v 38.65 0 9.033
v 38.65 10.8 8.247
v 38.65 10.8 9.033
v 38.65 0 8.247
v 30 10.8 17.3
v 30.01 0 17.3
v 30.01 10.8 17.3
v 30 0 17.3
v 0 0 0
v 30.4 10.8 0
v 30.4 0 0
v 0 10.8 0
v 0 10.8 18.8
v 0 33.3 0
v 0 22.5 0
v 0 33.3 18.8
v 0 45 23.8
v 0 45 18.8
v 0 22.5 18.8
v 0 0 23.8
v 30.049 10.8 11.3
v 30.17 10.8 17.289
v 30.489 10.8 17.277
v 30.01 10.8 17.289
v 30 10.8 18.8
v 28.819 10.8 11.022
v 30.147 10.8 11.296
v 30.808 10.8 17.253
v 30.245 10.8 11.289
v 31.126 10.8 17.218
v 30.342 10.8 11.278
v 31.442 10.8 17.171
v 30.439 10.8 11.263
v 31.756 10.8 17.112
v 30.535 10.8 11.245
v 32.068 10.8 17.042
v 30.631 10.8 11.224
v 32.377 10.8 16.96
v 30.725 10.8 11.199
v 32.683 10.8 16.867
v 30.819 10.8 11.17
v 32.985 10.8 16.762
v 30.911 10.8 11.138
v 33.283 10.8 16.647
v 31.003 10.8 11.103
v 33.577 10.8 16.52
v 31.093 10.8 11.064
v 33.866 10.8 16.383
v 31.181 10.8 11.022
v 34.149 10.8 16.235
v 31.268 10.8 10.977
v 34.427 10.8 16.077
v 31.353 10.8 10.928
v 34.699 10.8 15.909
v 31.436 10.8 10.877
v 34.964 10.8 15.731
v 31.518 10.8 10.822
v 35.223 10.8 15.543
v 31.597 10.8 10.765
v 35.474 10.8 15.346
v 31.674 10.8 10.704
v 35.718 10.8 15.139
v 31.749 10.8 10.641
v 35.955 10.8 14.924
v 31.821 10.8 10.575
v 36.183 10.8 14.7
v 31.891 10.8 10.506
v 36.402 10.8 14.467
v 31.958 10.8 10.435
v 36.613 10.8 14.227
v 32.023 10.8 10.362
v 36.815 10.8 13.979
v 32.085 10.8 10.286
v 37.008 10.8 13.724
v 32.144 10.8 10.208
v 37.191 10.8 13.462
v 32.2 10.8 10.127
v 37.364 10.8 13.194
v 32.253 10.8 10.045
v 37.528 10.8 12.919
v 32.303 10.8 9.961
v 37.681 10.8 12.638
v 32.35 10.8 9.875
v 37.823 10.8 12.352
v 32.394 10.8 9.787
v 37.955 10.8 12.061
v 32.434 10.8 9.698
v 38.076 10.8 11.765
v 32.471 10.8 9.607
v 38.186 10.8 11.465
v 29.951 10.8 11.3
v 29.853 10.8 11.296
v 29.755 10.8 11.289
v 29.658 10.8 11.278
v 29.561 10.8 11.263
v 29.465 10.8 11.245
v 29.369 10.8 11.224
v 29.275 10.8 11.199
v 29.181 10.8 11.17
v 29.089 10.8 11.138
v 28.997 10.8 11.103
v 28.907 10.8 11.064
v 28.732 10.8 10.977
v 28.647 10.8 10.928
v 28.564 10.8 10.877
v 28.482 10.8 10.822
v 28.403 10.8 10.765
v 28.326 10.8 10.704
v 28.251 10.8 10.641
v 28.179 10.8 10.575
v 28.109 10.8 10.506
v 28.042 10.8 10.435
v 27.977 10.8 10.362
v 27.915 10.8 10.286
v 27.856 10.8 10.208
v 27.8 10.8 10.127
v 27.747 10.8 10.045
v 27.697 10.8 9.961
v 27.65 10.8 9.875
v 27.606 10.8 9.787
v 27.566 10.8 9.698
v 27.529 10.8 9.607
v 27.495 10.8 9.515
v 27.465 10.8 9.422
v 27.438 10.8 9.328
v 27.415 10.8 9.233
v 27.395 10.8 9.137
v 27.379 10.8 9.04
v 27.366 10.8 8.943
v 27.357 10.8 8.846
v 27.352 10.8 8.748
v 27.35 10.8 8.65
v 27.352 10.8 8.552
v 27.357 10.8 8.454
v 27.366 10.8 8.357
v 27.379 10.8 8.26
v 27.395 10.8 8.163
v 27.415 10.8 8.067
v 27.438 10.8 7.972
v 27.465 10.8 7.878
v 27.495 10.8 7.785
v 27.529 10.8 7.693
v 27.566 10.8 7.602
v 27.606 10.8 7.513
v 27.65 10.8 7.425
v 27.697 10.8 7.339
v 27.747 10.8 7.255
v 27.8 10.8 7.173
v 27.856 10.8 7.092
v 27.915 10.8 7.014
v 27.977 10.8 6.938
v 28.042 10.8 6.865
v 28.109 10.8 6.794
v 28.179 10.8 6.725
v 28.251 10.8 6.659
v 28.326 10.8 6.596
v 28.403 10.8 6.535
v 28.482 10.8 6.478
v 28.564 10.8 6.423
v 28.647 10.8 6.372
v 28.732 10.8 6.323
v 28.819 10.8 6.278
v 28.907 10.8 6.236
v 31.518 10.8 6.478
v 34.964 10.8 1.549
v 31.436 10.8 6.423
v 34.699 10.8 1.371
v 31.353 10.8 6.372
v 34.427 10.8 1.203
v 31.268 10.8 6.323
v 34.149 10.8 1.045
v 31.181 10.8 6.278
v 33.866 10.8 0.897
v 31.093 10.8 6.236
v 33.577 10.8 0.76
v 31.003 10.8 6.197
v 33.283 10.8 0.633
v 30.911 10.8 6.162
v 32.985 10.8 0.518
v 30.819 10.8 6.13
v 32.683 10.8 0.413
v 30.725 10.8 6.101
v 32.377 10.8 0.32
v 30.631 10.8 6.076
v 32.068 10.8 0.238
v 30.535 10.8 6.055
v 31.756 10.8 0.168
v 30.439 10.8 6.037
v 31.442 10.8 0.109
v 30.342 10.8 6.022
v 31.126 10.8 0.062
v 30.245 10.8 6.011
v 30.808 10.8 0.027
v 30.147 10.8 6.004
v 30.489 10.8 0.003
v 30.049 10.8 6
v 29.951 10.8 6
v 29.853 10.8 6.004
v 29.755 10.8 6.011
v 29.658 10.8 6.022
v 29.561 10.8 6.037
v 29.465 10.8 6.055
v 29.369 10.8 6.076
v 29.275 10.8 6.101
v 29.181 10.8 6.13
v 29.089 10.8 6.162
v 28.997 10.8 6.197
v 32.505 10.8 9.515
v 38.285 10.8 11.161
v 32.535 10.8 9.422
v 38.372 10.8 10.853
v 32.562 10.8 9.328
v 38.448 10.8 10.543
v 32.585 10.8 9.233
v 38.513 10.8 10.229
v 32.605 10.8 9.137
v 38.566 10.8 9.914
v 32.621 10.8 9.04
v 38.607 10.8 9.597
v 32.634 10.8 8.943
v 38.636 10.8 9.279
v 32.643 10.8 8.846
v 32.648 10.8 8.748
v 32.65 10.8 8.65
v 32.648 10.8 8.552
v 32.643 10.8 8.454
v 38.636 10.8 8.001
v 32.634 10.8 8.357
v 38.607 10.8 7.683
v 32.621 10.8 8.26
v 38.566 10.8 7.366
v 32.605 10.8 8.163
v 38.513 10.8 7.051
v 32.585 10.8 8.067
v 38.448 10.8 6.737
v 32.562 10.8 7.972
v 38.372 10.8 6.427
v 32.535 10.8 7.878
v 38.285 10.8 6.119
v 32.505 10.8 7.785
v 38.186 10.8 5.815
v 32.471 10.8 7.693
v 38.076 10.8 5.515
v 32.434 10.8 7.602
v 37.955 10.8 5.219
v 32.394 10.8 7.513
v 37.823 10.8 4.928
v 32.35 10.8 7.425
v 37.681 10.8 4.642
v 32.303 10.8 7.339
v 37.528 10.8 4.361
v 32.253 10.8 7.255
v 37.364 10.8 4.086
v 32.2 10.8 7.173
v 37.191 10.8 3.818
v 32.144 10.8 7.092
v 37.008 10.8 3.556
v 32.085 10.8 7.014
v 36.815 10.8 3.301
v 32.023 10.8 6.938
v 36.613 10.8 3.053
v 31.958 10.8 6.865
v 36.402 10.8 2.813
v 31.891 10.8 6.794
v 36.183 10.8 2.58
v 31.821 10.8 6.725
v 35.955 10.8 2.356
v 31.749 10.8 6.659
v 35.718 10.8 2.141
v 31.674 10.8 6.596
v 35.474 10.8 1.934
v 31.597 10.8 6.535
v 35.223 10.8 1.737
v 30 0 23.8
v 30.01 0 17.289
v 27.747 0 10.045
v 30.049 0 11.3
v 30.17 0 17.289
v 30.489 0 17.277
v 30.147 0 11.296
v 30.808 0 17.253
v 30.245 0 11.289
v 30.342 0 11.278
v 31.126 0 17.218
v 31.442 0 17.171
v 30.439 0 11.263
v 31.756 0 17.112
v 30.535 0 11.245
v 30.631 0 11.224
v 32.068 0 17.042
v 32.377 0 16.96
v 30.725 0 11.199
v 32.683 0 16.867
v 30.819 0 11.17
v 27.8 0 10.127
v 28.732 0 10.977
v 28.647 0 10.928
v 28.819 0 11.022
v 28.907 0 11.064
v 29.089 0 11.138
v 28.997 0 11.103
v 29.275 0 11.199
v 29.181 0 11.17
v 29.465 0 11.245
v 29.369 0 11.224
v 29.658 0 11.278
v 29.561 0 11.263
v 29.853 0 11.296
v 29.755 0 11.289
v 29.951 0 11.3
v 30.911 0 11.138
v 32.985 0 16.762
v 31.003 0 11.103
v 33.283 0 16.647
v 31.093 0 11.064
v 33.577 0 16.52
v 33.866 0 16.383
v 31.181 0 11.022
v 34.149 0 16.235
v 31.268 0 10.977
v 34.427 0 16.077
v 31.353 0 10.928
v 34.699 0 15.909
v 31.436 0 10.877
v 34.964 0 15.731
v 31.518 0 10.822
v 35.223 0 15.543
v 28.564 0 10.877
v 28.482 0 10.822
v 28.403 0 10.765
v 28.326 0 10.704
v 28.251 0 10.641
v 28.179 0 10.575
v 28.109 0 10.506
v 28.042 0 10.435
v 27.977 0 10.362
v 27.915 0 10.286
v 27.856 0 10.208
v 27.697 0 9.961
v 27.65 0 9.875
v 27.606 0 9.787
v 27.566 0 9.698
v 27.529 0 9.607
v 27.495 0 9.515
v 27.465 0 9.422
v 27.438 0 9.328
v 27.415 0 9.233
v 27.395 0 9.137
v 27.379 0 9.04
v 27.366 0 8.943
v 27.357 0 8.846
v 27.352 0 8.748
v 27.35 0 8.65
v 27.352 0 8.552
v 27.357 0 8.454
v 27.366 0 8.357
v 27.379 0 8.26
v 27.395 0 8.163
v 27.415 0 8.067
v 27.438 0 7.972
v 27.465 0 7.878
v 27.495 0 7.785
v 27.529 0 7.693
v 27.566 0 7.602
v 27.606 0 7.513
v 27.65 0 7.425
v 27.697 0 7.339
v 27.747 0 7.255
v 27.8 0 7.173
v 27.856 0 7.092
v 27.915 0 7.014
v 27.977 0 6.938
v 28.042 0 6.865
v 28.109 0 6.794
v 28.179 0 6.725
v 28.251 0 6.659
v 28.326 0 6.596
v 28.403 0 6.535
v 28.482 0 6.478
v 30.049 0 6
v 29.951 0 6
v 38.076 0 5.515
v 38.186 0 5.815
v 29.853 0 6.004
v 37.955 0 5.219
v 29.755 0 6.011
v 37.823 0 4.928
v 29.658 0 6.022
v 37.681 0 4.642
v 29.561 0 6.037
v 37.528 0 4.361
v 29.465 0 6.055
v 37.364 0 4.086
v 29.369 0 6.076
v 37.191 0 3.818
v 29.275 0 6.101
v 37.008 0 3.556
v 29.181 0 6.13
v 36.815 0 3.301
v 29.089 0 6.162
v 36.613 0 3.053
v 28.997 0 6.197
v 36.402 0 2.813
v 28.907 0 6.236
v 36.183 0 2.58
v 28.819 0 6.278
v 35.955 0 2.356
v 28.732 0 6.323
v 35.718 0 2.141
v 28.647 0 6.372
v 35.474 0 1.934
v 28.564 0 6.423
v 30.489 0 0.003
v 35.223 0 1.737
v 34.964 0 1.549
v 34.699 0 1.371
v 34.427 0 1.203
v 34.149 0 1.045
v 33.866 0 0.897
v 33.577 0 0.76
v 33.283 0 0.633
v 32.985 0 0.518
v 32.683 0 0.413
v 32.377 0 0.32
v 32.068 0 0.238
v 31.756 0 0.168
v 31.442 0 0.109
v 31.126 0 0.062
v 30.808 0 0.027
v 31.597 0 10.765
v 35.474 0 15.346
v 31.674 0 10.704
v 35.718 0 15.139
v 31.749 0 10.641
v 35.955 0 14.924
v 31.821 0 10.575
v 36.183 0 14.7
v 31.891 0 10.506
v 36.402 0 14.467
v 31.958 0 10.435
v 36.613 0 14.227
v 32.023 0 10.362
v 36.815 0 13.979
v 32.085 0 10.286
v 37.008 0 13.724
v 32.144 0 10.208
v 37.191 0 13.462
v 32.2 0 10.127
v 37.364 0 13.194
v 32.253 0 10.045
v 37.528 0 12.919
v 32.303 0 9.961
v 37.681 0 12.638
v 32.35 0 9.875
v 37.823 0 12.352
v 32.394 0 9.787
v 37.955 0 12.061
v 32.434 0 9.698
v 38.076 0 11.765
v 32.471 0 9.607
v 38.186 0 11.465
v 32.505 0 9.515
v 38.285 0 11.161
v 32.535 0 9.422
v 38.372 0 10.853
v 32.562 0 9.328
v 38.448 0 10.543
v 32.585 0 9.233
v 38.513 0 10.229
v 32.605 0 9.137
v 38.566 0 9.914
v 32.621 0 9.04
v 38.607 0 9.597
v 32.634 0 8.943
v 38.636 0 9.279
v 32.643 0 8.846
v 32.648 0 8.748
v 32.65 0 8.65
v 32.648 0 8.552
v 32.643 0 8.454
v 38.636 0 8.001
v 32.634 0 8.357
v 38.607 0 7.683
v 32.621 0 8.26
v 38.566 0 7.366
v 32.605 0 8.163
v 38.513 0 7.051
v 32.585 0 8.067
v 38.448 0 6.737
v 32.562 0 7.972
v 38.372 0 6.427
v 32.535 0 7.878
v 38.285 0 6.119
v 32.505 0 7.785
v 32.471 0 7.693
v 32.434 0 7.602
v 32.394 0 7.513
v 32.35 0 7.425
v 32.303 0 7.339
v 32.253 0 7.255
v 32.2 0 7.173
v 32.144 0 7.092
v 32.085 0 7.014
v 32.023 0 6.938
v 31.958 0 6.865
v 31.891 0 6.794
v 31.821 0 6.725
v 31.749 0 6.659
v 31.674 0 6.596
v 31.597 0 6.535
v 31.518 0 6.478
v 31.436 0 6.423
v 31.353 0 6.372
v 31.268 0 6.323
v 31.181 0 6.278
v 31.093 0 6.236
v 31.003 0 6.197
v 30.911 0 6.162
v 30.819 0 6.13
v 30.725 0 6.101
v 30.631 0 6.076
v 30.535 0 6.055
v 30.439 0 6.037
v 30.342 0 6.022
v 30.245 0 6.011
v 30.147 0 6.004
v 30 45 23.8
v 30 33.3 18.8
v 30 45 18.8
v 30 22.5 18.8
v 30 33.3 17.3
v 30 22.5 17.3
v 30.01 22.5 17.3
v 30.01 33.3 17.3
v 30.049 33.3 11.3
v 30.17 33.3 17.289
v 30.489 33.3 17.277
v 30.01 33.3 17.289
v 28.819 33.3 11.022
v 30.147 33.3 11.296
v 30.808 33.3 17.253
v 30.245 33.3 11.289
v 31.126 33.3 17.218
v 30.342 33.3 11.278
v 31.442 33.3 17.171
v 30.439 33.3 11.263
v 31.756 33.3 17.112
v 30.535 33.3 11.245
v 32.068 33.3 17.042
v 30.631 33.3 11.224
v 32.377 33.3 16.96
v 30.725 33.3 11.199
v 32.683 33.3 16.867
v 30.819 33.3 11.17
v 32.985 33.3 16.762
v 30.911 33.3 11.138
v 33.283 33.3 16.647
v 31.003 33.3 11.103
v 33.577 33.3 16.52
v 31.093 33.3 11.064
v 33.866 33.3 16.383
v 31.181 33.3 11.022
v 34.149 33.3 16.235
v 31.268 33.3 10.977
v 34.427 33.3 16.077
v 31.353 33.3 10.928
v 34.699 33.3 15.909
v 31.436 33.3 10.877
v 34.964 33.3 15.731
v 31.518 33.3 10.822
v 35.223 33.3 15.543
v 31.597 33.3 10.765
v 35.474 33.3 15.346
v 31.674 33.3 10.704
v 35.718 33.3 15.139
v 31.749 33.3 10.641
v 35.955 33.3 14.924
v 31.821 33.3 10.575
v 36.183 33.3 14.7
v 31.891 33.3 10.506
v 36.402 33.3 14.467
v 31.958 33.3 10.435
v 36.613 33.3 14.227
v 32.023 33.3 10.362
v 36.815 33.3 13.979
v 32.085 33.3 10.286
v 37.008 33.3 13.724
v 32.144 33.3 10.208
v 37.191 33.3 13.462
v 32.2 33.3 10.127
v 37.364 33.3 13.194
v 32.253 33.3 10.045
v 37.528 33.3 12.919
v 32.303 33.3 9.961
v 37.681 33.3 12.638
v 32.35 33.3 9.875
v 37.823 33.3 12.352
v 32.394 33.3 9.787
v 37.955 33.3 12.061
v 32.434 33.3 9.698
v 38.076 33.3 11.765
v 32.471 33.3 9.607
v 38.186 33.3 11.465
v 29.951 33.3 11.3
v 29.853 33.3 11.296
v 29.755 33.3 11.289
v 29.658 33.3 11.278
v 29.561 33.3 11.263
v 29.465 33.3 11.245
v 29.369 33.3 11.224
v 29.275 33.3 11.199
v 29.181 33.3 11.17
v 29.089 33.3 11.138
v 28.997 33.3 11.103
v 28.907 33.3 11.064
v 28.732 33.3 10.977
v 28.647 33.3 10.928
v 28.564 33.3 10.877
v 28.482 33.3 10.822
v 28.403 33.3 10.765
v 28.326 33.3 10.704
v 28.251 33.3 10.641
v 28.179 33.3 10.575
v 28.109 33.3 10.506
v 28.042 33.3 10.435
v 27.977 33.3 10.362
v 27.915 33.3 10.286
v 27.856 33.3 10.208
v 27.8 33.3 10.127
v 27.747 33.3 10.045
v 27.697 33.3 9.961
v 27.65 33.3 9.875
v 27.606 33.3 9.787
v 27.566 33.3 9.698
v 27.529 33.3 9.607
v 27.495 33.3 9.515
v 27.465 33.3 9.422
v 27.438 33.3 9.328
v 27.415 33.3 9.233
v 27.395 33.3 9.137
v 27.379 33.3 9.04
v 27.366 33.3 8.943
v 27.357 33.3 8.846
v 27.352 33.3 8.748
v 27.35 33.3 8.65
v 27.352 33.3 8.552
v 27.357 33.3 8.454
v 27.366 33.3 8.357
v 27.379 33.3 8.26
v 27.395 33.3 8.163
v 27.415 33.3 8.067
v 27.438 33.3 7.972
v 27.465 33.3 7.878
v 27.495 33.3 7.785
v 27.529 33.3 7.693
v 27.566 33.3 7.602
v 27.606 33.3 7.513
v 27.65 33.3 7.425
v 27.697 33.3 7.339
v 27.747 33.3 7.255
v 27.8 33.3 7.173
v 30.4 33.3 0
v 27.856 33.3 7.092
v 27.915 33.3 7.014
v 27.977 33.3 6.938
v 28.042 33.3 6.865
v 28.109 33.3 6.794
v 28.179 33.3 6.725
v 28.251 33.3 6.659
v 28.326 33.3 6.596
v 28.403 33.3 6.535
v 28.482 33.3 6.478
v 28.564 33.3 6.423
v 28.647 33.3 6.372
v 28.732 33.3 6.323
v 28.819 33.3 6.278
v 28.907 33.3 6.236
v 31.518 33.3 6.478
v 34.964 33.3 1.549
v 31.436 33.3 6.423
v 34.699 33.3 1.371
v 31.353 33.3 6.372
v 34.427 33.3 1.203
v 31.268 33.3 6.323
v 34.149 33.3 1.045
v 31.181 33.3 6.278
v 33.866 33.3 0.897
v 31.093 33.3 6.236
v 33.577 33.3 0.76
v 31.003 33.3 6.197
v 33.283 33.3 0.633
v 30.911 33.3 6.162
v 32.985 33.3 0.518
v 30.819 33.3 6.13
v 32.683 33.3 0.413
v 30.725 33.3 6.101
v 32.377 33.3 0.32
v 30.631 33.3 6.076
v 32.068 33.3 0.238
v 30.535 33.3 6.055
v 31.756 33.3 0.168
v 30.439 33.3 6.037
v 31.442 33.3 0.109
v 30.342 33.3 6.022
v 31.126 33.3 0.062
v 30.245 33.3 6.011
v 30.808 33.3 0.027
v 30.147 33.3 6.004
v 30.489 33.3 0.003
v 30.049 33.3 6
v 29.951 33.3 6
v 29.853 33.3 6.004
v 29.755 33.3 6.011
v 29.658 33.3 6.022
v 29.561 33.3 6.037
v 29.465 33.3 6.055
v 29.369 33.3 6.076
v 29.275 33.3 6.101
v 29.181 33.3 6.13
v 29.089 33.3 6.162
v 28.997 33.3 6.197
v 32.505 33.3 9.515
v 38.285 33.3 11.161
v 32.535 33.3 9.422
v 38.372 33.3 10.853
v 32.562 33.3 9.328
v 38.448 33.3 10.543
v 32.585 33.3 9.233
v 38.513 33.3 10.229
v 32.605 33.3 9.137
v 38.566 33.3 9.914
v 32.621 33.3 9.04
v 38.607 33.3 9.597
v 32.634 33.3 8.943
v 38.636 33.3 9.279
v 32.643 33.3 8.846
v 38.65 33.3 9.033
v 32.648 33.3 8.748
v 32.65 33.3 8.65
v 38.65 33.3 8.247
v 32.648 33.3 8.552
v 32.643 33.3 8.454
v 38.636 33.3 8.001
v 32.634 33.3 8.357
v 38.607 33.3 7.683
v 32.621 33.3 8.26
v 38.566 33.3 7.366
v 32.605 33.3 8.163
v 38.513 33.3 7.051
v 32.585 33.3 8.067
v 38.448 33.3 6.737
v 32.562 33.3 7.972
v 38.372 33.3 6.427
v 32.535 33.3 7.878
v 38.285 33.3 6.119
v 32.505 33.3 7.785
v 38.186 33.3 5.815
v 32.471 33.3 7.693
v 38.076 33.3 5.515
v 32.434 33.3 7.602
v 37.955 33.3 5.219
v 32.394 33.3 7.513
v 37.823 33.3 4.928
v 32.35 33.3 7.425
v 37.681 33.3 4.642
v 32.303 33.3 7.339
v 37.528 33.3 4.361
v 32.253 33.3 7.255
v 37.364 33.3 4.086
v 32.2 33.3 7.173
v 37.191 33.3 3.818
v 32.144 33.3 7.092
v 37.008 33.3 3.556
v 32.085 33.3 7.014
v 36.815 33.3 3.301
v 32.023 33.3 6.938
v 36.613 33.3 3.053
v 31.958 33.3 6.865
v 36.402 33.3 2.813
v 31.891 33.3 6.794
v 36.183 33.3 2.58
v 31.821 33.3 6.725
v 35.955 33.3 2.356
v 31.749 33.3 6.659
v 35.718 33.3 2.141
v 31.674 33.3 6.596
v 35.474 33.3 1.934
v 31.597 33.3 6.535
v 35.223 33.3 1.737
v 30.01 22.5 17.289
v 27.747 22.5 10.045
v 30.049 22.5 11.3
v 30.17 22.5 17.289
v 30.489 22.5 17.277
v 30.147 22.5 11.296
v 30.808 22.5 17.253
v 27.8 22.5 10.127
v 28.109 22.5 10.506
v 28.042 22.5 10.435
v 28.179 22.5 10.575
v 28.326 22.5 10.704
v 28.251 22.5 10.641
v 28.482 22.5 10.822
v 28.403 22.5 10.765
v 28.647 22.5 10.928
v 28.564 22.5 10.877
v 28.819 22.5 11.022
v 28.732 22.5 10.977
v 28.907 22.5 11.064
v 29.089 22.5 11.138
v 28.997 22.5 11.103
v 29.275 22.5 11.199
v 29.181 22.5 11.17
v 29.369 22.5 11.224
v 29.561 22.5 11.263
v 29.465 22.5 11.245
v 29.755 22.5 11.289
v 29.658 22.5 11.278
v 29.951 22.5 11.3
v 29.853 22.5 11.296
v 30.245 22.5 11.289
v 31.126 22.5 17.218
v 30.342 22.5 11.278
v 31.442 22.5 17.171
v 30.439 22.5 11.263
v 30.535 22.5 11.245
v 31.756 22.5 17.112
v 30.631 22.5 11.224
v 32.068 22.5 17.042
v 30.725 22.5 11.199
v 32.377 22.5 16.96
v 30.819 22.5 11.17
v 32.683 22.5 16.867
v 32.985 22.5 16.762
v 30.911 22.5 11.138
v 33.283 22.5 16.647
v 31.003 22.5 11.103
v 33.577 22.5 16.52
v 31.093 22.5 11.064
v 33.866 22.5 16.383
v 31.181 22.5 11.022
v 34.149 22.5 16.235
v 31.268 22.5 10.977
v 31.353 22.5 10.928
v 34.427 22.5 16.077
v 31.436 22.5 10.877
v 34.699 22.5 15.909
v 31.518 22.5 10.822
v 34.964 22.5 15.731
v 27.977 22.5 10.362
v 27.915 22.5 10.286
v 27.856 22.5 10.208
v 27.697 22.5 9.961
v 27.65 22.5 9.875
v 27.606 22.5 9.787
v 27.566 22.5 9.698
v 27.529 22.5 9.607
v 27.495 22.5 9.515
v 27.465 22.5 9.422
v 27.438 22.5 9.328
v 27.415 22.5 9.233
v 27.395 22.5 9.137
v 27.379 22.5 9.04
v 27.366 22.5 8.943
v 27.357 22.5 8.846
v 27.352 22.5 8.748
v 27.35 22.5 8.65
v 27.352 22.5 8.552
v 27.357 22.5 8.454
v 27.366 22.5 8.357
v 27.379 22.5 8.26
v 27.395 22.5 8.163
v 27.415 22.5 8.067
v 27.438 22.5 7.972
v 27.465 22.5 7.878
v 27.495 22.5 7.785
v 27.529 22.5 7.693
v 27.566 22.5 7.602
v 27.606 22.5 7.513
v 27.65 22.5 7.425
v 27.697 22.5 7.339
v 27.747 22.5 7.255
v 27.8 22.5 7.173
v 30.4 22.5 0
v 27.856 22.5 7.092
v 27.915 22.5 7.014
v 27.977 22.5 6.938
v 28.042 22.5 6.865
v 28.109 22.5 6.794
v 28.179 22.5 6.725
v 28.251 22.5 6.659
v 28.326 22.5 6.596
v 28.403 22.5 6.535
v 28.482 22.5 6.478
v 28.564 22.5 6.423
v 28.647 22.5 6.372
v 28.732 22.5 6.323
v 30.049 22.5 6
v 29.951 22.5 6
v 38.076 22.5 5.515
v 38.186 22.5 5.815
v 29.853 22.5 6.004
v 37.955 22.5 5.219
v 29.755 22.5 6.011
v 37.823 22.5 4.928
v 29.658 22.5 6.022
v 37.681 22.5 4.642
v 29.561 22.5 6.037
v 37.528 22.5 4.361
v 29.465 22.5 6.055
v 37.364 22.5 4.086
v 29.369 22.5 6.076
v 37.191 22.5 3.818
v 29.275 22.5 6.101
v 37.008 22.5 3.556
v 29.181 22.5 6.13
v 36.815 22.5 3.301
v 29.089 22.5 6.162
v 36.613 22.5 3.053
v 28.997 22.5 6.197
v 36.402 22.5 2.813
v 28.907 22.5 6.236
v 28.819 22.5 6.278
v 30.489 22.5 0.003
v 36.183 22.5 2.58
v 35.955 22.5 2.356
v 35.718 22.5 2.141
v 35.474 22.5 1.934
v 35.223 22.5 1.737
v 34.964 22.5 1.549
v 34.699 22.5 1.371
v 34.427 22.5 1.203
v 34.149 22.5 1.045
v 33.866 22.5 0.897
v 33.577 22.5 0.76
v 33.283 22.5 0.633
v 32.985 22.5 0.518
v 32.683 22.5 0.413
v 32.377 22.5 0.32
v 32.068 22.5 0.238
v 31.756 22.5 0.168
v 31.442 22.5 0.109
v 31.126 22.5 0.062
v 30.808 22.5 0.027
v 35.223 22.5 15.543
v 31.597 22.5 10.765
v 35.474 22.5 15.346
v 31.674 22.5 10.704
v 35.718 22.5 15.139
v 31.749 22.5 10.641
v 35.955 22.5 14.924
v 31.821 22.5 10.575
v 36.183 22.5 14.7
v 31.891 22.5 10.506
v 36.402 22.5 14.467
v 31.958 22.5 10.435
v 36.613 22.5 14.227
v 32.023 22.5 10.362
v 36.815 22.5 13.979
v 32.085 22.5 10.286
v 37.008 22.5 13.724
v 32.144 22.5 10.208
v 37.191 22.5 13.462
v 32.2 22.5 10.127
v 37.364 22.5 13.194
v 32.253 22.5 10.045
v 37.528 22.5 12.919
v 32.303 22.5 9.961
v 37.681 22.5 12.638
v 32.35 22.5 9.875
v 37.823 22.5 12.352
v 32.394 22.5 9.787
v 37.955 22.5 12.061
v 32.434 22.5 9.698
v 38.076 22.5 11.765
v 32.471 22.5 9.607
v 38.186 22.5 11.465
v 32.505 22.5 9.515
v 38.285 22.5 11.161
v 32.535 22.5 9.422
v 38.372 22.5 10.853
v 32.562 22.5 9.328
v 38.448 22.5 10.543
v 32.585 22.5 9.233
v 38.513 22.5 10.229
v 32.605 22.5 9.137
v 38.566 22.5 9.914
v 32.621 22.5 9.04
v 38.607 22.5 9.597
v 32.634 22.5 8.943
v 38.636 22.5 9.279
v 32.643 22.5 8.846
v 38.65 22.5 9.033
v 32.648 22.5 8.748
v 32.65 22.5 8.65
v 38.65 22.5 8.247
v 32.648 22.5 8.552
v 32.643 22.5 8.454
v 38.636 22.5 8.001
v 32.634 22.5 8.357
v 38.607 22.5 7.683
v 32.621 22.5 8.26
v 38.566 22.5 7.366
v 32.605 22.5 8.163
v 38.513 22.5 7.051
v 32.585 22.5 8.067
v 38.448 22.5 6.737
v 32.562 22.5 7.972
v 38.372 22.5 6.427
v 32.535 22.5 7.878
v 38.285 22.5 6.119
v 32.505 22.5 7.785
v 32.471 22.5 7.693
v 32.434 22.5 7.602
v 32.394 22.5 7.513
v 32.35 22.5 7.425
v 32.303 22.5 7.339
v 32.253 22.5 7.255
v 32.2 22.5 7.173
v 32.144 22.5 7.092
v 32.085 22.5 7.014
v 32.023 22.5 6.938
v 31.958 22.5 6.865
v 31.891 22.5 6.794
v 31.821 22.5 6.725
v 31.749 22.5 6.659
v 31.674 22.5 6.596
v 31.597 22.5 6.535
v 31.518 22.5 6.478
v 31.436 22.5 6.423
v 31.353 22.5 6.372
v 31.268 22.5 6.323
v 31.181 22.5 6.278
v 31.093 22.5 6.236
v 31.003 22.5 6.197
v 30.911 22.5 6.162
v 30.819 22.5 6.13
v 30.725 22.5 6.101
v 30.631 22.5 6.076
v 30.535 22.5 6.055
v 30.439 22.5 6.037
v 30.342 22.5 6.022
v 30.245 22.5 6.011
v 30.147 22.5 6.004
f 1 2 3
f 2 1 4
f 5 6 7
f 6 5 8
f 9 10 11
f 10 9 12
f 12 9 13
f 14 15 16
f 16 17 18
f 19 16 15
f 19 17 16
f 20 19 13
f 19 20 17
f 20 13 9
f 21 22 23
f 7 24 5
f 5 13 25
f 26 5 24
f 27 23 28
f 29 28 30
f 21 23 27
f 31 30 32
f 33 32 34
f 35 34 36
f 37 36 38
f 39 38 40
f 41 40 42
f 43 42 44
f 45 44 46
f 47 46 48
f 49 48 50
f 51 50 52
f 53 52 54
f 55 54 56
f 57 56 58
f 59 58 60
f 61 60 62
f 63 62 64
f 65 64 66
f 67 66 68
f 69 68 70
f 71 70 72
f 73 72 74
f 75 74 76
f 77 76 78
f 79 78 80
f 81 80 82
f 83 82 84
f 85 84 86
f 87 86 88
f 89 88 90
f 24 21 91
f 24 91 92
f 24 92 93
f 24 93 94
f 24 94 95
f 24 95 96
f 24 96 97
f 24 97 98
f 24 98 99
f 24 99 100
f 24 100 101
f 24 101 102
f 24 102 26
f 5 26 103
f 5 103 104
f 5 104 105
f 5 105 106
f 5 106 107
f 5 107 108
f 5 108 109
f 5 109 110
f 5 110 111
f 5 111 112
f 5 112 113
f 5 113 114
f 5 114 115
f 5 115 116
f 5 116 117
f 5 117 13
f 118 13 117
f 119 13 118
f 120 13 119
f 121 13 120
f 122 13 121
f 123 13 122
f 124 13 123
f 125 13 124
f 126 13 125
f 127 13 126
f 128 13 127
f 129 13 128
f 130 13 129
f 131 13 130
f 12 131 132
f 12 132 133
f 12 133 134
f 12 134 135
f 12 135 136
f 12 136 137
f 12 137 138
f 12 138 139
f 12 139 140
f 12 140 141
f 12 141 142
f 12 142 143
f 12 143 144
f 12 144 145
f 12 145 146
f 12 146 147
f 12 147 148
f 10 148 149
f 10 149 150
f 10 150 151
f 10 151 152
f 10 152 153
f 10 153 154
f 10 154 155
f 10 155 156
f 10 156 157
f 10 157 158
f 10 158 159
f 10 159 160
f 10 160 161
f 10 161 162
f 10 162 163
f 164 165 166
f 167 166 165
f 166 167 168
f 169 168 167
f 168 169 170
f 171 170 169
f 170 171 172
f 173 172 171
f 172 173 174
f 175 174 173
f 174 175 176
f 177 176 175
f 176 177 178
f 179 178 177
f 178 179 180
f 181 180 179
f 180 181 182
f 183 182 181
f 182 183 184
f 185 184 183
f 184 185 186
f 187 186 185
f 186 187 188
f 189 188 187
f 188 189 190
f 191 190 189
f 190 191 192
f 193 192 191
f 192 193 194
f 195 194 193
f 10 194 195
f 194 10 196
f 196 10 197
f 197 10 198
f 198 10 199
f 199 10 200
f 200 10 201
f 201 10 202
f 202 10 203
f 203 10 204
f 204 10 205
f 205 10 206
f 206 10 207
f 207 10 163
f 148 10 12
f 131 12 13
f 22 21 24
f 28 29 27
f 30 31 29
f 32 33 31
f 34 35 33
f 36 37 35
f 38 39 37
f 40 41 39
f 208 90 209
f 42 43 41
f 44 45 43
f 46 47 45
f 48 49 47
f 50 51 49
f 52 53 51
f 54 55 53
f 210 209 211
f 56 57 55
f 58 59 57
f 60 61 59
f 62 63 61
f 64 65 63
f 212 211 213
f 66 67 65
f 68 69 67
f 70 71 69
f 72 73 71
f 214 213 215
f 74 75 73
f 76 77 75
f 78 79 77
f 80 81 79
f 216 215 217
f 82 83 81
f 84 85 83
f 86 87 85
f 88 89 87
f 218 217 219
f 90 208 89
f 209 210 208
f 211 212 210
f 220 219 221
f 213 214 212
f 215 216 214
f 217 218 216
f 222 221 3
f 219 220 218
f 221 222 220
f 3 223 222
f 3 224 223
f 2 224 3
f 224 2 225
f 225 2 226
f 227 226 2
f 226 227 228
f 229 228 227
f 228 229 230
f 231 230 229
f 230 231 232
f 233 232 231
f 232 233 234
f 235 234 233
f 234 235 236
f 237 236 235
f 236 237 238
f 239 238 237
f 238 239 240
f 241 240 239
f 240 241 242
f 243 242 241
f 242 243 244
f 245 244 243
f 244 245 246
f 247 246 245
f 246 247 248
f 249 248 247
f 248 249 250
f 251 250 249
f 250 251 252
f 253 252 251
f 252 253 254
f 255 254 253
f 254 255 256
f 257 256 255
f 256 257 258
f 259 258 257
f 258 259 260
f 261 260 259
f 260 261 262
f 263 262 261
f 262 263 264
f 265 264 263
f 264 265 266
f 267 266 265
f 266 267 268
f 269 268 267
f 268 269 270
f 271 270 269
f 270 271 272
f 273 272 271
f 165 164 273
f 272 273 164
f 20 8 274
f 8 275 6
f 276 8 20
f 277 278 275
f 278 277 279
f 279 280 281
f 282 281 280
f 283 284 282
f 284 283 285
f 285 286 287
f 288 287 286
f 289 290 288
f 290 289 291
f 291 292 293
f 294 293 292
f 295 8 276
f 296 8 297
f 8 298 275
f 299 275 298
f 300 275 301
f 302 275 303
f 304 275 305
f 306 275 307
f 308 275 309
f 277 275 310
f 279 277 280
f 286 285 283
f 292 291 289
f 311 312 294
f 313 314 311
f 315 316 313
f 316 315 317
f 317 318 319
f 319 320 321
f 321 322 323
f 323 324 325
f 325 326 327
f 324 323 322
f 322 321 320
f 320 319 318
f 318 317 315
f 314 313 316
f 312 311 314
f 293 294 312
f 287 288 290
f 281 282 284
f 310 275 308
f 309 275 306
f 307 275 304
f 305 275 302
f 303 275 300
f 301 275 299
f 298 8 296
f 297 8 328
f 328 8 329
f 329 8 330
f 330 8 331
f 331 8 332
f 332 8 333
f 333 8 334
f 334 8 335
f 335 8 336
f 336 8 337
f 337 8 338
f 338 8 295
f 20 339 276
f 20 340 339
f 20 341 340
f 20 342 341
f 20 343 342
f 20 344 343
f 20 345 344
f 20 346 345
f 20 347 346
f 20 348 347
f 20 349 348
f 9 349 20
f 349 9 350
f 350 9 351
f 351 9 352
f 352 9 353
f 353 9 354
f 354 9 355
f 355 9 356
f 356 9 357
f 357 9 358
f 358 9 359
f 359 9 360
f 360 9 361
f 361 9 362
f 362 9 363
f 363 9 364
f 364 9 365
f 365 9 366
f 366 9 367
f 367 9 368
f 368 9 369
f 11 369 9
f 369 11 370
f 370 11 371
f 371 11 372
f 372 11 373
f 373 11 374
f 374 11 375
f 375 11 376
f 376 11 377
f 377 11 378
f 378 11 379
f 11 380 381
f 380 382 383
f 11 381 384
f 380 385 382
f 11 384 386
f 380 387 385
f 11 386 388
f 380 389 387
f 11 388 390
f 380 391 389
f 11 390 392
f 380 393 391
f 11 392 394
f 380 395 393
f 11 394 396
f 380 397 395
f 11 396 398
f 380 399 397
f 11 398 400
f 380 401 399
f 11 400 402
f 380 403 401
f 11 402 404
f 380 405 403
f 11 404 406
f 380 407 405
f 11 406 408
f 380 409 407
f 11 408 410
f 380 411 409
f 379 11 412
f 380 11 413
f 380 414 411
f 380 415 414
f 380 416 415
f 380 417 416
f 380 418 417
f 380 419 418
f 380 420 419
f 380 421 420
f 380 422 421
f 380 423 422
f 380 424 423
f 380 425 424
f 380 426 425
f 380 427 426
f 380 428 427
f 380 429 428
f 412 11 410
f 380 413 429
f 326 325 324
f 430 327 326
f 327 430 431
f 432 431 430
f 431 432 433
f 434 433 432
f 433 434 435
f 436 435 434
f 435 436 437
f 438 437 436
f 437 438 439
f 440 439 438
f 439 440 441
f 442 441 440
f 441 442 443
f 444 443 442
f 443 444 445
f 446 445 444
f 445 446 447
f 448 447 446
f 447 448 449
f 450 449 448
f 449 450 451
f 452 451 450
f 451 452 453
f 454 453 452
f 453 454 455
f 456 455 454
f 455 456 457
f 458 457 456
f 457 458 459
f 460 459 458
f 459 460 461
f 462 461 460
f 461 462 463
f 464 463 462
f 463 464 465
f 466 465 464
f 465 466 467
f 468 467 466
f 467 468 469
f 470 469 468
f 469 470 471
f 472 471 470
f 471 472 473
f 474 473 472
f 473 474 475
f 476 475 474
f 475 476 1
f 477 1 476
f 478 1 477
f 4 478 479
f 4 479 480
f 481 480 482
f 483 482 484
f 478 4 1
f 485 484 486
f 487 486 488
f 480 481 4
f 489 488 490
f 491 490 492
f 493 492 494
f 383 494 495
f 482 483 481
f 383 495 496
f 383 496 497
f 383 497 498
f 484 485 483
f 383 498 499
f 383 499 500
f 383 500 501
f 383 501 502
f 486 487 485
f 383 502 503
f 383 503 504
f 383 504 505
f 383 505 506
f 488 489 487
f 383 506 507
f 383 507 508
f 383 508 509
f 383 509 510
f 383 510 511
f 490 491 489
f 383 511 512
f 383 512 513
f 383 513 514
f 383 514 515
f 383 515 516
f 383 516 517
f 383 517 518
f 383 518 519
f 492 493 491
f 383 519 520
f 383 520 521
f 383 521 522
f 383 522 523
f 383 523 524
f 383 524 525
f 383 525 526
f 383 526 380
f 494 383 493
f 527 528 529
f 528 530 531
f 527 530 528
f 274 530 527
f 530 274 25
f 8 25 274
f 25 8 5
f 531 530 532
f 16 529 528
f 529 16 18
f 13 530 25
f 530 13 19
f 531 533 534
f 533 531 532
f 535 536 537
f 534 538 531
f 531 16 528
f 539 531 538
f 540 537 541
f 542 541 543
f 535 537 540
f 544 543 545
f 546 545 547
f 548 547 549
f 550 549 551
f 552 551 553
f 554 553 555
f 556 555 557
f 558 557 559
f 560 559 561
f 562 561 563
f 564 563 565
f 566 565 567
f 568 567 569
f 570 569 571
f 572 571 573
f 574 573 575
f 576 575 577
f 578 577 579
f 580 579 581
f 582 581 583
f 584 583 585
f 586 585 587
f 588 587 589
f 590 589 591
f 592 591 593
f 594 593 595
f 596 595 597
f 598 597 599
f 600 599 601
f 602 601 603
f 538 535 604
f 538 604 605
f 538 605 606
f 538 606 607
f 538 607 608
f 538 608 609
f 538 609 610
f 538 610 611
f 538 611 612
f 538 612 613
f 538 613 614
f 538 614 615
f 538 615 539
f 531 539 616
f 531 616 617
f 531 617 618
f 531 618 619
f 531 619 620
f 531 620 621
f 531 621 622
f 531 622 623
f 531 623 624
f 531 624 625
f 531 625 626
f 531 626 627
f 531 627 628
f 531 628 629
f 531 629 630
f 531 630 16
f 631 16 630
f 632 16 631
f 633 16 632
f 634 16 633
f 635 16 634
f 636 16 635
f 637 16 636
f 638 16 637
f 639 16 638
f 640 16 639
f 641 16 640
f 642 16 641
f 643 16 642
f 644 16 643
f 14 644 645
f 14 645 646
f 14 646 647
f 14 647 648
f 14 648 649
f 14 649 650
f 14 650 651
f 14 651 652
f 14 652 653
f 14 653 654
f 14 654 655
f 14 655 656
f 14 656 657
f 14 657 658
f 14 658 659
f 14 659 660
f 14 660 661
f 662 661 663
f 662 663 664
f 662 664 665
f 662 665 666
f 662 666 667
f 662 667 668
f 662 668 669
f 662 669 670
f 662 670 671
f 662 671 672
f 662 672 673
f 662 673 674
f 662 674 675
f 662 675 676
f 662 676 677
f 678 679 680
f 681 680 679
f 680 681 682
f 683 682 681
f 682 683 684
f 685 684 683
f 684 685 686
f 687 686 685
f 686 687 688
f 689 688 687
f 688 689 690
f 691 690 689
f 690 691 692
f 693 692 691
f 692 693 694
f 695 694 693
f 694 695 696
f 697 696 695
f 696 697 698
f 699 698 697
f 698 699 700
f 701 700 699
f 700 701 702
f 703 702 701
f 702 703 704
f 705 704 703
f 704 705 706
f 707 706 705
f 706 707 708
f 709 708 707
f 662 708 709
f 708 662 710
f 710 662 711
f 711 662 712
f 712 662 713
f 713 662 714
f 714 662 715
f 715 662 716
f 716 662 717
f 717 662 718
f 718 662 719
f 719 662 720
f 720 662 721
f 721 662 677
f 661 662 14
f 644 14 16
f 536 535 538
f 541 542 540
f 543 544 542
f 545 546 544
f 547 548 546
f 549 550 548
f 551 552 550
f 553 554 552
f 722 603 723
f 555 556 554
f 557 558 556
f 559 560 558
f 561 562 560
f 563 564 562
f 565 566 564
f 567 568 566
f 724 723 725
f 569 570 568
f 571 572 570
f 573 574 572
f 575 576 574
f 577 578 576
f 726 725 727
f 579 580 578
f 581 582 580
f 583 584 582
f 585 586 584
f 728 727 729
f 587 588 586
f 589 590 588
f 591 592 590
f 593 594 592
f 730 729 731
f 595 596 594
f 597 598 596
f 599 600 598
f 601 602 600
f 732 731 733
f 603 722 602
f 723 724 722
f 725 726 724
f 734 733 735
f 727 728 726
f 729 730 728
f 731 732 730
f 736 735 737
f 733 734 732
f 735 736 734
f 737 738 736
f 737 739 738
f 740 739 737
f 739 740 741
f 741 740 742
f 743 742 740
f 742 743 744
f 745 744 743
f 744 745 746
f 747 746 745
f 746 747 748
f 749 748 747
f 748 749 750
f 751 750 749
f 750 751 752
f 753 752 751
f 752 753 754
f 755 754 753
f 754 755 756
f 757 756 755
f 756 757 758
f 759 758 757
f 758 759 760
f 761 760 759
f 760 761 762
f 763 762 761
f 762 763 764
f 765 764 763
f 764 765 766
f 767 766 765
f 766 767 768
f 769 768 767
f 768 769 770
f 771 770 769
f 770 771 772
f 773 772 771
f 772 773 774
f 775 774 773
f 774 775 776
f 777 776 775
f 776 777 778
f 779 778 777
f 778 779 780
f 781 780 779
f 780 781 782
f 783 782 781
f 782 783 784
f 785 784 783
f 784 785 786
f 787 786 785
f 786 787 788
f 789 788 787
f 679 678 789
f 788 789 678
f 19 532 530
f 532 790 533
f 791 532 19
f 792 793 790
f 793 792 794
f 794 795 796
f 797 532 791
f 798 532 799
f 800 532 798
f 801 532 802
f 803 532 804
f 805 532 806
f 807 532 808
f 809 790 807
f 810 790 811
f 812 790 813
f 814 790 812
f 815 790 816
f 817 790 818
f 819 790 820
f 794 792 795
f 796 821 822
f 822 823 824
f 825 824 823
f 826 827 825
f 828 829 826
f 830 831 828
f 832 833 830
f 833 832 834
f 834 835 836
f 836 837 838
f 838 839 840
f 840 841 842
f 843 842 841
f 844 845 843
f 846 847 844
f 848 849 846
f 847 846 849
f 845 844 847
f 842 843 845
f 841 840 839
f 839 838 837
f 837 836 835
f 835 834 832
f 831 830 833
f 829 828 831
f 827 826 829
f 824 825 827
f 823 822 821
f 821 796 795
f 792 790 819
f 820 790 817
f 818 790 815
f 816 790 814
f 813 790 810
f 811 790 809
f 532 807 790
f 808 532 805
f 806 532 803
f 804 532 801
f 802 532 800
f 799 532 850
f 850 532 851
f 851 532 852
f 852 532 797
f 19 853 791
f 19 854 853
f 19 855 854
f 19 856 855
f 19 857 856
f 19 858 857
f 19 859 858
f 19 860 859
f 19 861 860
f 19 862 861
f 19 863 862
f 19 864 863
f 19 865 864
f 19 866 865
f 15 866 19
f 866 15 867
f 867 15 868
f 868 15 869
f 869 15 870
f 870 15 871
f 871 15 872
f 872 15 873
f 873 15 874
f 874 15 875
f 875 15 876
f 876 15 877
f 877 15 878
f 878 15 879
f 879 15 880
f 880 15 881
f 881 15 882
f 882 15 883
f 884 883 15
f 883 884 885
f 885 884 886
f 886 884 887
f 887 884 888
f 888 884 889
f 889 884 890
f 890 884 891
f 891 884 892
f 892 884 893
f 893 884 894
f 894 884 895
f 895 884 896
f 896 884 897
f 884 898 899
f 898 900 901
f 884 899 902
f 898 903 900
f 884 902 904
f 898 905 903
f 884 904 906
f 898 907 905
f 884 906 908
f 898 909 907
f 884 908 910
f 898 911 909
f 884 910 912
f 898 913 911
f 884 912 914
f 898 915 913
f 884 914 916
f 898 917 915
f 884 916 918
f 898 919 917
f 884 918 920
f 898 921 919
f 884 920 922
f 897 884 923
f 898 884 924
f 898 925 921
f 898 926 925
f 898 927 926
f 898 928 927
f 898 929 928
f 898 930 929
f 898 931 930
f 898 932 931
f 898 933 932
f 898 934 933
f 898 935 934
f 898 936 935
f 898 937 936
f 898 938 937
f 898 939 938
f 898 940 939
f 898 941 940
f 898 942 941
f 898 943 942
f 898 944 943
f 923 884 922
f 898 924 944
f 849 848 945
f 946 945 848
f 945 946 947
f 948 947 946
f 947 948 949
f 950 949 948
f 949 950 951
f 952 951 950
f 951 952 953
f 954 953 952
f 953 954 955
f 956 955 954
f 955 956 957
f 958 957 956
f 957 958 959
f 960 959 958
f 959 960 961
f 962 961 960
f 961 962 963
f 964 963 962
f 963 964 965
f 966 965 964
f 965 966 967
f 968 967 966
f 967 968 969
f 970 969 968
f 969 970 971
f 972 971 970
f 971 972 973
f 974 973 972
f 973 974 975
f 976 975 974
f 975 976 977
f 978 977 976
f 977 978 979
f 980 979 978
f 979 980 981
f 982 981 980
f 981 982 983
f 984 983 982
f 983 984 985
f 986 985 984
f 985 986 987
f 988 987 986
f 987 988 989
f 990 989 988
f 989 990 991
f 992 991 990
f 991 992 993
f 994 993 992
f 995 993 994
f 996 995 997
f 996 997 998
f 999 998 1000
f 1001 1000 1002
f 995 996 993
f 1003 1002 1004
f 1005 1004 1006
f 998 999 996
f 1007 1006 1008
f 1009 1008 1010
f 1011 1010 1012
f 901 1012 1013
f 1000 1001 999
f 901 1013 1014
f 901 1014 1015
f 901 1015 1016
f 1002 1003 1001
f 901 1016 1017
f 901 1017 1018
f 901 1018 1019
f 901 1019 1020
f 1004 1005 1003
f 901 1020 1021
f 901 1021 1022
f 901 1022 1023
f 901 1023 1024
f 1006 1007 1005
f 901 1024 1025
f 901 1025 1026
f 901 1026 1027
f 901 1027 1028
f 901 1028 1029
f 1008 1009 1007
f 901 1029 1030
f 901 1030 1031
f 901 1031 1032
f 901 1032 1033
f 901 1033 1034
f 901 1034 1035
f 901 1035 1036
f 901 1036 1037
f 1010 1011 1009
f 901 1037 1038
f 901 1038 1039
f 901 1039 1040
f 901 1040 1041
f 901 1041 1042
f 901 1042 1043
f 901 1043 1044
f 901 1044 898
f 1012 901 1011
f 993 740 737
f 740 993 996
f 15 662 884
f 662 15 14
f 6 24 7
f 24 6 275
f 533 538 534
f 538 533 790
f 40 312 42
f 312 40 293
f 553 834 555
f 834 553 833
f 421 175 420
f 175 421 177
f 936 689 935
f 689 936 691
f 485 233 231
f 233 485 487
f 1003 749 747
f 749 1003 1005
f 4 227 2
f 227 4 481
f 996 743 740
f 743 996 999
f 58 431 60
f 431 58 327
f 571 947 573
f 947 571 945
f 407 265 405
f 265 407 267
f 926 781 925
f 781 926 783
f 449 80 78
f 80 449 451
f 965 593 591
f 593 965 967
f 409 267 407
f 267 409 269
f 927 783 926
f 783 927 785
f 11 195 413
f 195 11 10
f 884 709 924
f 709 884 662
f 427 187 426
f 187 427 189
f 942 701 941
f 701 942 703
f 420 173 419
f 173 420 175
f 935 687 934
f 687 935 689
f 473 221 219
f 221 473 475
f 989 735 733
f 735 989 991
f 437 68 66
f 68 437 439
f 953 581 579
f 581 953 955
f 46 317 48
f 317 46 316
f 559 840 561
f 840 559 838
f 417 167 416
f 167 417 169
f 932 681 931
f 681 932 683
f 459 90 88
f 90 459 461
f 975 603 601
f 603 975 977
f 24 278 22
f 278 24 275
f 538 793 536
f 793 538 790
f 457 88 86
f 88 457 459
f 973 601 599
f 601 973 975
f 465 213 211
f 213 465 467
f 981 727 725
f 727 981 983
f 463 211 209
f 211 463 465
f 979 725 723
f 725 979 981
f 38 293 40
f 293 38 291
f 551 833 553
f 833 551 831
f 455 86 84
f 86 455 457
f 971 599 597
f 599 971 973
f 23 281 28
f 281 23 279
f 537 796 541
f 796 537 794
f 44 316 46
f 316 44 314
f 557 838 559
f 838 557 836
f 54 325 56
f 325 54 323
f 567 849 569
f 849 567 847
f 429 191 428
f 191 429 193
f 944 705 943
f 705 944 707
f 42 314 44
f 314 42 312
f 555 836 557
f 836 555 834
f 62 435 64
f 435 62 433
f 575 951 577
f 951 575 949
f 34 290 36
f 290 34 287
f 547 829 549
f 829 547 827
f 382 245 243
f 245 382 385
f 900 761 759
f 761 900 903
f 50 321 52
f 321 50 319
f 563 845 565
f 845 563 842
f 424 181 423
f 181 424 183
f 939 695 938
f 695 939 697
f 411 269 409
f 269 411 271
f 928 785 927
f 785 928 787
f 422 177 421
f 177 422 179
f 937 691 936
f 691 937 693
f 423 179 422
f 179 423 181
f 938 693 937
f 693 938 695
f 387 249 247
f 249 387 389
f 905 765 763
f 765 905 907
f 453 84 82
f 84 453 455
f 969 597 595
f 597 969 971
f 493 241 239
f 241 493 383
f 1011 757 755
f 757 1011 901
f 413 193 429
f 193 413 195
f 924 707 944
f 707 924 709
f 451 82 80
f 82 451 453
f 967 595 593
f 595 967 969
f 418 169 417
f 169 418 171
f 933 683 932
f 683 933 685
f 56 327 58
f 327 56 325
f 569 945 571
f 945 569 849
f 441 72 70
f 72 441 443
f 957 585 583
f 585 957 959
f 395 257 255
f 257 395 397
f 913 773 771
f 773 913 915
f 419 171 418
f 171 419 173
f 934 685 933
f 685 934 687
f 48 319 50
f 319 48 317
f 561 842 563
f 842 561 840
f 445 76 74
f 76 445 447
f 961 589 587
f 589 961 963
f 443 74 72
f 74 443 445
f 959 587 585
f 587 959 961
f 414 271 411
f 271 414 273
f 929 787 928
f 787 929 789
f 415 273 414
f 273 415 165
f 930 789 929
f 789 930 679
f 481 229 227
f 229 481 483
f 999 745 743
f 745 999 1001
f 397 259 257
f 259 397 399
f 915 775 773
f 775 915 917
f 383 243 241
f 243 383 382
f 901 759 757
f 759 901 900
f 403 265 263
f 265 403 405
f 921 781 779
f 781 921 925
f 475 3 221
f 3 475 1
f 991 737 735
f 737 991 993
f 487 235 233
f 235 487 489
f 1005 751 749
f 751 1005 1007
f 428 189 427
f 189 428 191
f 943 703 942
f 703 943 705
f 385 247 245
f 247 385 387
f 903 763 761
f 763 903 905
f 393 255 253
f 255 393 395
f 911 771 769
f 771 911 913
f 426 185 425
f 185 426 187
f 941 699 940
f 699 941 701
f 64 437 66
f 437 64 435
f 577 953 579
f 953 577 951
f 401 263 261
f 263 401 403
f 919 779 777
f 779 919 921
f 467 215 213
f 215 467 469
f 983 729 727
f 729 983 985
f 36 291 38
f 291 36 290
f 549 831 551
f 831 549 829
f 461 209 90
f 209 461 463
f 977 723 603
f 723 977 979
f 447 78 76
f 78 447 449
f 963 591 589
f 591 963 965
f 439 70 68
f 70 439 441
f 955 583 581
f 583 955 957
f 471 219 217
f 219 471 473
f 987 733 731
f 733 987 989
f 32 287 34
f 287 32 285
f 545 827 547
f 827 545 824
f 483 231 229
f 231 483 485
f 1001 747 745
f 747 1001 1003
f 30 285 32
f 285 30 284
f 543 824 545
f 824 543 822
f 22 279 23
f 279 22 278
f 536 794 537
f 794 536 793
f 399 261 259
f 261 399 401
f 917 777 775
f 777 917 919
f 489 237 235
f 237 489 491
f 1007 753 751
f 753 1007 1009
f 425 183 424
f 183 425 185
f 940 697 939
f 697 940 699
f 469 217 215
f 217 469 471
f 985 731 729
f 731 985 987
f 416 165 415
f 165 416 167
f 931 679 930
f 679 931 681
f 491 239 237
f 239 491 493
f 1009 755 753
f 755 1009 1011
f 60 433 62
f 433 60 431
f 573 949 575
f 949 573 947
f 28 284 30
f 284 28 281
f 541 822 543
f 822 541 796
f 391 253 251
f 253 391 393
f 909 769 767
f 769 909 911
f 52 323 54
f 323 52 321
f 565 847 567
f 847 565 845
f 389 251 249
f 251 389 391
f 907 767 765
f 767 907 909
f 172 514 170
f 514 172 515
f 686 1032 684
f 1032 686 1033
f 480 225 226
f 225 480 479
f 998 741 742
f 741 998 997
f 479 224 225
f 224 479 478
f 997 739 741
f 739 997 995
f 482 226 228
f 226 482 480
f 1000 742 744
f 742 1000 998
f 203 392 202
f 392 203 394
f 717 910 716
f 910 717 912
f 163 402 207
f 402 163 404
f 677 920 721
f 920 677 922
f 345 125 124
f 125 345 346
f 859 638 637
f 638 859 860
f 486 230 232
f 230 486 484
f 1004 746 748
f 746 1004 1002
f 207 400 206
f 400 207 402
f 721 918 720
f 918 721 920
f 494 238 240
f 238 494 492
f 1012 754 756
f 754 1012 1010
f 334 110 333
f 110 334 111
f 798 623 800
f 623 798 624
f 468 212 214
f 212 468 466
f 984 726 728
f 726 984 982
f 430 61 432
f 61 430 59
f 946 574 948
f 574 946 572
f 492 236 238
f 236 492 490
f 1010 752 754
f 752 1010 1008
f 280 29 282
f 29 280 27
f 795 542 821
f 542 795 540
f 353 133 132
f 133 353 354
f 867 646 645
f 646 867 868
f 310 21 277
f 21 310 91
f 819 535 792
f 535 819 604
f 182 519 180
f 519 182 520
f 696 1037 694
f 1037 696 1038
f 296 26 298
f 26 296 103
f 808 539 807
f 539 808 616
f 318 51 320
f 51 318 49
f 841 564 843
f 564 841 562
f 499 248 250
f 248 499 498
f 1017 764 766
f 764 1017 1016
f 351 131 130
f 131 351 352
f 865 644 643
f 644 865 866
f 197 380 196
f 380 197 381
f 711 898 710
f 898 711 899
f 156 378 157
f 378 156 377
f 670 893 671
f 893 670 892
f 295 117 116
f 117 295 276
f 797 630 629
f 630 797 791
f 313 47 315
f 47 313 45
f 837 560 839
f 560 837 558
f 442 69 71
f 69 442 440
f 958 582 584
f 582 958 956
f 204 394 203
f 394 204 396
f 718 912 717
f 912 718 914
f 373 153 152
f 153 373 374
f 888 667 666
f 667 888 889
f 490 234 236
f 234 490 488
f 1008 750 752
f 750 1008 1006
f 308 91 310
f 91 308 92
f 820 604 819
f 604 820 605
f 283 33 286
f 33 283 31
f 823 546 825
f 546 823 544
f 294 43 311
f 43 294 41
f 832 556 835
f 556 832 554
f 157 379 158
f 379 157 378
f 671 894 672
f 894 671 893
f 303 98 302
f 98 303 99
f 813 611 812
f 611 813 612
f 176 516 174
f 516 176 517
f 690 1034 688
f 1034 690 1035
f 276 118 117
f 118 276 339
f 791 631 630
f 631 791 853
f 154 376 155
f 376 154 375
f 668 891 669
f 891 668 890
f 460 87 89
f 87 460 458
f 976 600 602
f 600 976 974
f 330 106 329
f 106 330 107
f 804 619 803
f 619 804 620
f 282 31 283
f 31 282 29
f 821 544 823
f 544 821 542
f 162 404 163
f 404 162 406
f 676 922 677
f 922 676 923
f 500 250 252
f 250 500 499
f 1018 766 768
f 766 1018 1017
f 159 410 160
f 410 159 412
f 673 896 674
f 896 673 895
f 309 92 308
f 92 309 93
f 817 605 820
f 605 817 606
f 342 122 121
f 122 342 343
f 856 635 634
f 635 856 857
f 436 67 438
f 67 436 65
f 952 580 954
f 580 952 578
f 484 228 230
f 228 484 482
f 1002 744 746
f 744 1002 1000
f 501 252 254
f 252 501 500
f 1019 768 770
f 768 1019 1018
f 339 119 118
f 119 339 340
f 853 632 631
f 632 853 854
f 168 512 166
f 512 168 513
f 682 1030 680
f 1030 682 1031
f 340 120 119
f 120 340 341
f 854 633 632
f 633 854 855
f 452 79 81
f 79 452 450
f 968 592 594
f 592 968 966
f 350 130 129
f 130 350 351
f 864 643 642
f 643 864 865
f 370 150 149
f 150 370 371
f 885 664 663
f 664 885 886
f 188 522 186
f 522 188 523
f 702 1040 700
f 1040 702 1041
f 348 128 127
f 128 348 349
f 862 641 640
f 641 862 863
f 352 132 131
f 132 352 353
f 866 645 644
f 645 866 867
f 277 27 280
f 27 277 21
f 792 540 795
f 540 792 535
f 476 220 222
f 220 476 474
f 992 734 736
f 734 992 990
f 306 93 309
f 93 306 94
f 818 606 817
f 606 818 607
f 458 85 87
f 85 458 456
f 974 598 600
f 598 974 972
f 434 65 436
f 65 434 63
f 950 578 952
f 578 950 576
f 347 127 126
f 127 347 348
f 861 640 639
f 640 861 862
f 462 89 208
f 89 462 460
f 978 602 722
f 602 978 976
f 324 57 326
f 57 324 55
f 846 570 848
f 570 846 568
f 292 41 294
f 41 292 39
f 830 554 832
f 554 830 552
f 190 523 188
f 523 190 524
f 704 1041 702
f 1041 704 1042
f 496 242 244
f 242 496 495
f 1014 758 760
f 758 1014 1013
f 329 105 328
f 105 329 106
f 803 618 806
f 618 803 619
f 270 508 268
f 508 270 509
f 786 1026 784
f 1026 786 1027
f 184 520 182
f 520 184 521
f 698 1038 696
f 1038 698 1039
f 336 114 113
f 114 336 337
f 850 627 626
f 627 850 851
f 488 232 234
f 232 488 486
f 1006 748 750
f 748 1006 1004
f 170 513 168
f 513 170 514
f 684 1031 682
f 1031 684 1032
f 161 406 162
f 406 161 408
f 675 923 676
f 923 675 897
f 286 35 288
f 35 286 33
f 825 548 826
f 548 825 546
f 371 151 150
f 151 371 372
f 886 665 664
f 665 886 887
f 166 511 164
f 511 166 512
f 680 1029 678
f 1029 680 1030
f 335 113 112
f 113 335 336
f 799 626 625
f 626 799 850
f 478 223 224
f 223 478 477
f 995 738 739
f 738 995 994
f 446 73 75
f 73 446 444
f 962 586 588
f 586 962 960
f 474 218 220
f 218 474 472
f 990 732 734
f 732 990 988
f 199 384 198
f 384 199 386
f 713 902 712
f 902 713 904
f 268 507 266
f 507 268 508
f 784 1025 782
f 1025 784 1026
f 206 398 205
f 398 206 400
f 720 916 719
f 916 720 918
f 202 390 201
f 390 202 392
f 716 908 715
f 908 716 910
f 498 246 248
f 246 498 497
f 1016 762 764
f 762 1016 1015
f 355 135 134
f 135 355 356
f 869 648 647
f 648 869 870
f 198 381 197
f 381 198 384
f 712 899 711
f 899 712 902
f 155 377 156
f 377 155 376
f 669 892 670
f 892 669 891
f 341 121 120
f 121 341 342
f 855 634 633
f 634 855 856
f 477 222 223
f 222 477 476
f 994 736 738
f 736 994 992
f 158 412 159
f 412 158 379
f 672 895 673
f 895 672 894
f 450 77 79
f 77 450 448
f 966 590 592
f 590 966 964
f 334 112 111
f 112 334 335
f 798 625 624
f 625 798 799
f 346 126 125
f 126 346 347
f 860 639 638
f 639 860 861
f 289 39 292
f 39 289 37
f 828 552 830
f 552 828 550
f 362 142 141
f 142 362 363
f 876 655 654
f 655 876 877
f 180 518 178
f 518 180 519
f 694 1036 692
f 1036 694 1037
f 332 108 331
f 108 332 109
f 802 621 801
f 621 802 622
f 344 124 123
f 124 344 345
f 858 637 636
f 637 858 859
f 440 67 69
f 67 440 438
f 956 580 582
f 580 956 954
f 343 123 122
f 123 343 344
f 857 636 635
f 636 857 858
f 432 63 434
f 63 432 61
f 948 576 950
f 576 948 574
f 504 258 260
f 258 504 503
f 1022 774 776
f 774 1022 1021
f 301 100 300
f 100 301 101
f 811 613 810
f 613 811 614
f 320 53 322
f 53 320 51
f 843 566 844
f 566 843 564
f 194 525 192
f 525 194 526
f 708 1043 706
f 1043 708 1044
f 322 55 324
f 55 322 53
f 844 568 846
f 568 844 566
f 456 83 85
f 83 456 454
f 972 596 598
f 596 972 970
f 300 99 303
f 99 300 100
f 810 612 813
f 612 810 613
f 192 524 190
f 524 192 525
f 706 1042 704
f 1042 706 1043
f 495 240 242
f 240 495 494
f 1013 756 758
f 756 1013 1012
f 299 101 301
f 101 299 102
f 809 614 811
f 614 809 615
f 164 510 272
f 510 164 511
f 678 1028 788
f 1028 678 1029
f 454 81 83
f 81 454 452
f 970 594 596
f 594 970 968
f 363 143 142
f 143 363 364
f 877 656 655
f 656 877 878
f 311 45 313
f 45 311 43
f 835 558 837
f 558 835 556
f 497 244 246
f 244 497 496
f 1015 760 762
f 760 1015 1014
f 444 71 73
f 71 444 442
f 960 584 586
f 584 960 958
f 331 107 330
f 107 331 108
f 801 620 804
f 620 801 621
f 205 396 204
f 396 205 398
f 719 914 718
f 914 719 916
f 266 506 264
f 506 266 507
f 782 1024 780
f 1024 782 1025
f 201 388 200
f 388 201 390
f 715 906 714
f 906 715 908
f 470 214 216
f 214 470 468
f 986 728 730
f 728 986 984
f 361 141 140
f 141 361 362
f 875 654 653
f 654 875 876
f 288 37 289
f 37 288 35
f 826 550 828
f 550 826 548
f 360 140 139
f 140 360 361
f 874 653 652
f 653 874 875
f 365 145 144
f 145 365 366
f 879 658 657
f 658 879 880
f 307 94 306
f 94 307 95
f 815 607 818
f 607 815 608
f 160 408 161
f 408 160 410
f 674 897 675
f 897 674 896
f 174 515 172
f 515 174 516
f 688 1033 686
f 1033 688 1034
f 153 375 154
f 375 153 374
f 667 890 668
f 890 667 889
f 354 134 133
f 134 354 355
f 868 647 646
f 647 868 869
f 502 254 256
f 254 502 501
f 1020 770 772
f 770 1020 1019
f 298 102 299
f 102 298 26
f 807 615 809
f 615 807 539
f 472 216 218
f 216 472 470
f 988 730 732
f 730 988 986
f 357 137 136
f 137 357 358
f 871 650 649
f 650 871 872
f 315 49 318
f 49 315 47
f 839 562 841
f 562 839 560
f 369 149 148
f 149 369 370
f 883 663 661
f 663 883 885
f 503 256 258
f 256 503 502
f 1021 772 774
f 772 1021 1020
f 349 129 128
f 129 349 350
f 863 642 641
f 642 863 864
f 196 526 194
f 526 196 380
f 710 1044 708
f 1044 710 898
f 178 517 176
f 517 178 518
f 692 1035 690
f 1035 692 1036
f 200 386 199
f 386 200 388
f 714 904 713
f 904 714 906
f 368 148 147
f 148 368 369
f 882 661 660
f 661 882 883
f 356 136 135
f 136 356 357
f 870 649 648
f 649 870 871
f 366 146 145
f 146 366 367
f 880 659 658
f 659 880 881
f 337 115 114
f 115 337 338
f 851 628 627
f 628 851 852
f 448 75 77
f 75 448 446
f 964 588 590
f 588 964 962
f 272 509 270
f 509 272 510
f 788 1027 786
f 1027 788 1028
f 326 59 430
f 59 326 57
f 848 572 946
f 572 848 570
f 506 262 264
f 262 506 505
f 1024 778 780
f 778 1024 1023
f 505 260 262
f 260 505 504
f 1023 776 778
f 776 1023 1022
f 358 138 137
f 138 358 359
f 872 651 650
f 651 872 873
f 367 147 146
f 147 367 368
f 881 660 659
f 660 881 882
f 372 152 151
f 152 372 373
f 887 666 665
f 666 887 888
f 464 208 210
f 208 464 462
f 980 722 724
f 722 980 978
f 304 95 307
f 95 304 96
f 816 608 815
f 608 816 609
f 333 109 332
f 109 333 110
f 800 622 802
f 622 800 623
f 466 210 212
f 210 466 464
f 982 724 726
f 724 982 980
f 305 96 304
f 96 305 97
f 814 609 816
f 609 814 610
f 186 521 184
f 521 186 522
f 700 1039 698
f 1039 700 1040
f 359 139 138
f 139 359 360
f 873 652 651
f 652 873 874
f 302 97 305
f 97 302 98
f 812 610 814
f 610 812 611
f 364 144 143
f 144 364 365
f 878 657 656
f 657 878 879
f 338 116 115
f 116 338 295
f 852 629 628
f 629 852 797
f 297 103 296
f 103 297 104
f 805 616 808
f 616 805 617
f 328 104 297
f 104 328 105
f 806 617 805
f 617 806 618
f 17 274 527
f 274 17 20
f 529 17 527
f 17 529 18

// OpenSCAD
// file: configure.scad
/*
 * file: configure.scad
 * author: gregor binder <gregor_reprap@catrix.at>
 * date: 09.12.2013
 * last change: 8.1.2014
 * license: CC BY-NC-SA 4.0
 */

// round_part
inner_diameter=22;
thickness=3;
nose_width=3;
nose_height=6;
round_part_inner_height=9;
round_part_height=45;
// angle
angle_plate_thickness=5;
angle_plate_widht=45;
angle_plate_lenght=30;
angle_hole_diameter=5.3;
angle_thickness=6;
angle_thickness_part2=1.5;
// position
position="right"; // left, right, middle

$fn=170;
// main file
/*
 * file: test-angle.scad
 * author: gregor binder <gregor_reprap@catrix.at>
 * date: 09.12.2013
 * last change: 8.1.2014
 * license: CC BY-NC-SA 4.0
 */

include <configure.scad>;

temp_height=angle_thickness*2+angle_hole_diameter;
temp_part_width=angle_plate_widht*0.24;
temp_part_length=angle_plate_lenght+temp_height/2;
temp_part_space=angle_plate_widht*0.26+temp_part_width;

module roundshape() {
	difference() {
	cube([temp_height/2,angle_plate_widht+5,angle_thickness*2+angle_hole_diameter+0.2]);
	translate([temp_height/2,-0.1,temp_height/2])
	rotate([-90,0,0])
		cylinder(h=angle_plate_widht+5,r=temp_height/2);
	}
}

module angle() {
	difference() {
	union() {
	cube([temp_part_length,temp_part_width,temp_height]);
	translate([0,0,temp_height])
		cube([temp_part_length-temp_height/2,temp_part_width,angle_thickness_part2]);
	translate([0,temp_part_space,temp_height])
		cube([temp_part_length-temp_height/2,temp_part_width,angle_thickness_part2]);
	translate([0,temp_part_space,0])
		cube([temp_part_length,temp_part_width,temp_height]);
	}
	translate([temp_part_length+0.01,angle_plate_widht,-0.01])
		rotate([0,0,180])
			roundshape();
	translate([temp_part_length-temp_height/2,-0.01,temp_height/2])
		rotate([-90,0,0])
			cylinder(h=angle_plate_widht+5,r=angle_hole_diameter/2);
	}
	// plate
	translate([0,0,temp_height+angle_thickness_part2])
		cube([angle_plate_lenght,angle_plate_widht,angle_plate_thickness]);
}

angle();
